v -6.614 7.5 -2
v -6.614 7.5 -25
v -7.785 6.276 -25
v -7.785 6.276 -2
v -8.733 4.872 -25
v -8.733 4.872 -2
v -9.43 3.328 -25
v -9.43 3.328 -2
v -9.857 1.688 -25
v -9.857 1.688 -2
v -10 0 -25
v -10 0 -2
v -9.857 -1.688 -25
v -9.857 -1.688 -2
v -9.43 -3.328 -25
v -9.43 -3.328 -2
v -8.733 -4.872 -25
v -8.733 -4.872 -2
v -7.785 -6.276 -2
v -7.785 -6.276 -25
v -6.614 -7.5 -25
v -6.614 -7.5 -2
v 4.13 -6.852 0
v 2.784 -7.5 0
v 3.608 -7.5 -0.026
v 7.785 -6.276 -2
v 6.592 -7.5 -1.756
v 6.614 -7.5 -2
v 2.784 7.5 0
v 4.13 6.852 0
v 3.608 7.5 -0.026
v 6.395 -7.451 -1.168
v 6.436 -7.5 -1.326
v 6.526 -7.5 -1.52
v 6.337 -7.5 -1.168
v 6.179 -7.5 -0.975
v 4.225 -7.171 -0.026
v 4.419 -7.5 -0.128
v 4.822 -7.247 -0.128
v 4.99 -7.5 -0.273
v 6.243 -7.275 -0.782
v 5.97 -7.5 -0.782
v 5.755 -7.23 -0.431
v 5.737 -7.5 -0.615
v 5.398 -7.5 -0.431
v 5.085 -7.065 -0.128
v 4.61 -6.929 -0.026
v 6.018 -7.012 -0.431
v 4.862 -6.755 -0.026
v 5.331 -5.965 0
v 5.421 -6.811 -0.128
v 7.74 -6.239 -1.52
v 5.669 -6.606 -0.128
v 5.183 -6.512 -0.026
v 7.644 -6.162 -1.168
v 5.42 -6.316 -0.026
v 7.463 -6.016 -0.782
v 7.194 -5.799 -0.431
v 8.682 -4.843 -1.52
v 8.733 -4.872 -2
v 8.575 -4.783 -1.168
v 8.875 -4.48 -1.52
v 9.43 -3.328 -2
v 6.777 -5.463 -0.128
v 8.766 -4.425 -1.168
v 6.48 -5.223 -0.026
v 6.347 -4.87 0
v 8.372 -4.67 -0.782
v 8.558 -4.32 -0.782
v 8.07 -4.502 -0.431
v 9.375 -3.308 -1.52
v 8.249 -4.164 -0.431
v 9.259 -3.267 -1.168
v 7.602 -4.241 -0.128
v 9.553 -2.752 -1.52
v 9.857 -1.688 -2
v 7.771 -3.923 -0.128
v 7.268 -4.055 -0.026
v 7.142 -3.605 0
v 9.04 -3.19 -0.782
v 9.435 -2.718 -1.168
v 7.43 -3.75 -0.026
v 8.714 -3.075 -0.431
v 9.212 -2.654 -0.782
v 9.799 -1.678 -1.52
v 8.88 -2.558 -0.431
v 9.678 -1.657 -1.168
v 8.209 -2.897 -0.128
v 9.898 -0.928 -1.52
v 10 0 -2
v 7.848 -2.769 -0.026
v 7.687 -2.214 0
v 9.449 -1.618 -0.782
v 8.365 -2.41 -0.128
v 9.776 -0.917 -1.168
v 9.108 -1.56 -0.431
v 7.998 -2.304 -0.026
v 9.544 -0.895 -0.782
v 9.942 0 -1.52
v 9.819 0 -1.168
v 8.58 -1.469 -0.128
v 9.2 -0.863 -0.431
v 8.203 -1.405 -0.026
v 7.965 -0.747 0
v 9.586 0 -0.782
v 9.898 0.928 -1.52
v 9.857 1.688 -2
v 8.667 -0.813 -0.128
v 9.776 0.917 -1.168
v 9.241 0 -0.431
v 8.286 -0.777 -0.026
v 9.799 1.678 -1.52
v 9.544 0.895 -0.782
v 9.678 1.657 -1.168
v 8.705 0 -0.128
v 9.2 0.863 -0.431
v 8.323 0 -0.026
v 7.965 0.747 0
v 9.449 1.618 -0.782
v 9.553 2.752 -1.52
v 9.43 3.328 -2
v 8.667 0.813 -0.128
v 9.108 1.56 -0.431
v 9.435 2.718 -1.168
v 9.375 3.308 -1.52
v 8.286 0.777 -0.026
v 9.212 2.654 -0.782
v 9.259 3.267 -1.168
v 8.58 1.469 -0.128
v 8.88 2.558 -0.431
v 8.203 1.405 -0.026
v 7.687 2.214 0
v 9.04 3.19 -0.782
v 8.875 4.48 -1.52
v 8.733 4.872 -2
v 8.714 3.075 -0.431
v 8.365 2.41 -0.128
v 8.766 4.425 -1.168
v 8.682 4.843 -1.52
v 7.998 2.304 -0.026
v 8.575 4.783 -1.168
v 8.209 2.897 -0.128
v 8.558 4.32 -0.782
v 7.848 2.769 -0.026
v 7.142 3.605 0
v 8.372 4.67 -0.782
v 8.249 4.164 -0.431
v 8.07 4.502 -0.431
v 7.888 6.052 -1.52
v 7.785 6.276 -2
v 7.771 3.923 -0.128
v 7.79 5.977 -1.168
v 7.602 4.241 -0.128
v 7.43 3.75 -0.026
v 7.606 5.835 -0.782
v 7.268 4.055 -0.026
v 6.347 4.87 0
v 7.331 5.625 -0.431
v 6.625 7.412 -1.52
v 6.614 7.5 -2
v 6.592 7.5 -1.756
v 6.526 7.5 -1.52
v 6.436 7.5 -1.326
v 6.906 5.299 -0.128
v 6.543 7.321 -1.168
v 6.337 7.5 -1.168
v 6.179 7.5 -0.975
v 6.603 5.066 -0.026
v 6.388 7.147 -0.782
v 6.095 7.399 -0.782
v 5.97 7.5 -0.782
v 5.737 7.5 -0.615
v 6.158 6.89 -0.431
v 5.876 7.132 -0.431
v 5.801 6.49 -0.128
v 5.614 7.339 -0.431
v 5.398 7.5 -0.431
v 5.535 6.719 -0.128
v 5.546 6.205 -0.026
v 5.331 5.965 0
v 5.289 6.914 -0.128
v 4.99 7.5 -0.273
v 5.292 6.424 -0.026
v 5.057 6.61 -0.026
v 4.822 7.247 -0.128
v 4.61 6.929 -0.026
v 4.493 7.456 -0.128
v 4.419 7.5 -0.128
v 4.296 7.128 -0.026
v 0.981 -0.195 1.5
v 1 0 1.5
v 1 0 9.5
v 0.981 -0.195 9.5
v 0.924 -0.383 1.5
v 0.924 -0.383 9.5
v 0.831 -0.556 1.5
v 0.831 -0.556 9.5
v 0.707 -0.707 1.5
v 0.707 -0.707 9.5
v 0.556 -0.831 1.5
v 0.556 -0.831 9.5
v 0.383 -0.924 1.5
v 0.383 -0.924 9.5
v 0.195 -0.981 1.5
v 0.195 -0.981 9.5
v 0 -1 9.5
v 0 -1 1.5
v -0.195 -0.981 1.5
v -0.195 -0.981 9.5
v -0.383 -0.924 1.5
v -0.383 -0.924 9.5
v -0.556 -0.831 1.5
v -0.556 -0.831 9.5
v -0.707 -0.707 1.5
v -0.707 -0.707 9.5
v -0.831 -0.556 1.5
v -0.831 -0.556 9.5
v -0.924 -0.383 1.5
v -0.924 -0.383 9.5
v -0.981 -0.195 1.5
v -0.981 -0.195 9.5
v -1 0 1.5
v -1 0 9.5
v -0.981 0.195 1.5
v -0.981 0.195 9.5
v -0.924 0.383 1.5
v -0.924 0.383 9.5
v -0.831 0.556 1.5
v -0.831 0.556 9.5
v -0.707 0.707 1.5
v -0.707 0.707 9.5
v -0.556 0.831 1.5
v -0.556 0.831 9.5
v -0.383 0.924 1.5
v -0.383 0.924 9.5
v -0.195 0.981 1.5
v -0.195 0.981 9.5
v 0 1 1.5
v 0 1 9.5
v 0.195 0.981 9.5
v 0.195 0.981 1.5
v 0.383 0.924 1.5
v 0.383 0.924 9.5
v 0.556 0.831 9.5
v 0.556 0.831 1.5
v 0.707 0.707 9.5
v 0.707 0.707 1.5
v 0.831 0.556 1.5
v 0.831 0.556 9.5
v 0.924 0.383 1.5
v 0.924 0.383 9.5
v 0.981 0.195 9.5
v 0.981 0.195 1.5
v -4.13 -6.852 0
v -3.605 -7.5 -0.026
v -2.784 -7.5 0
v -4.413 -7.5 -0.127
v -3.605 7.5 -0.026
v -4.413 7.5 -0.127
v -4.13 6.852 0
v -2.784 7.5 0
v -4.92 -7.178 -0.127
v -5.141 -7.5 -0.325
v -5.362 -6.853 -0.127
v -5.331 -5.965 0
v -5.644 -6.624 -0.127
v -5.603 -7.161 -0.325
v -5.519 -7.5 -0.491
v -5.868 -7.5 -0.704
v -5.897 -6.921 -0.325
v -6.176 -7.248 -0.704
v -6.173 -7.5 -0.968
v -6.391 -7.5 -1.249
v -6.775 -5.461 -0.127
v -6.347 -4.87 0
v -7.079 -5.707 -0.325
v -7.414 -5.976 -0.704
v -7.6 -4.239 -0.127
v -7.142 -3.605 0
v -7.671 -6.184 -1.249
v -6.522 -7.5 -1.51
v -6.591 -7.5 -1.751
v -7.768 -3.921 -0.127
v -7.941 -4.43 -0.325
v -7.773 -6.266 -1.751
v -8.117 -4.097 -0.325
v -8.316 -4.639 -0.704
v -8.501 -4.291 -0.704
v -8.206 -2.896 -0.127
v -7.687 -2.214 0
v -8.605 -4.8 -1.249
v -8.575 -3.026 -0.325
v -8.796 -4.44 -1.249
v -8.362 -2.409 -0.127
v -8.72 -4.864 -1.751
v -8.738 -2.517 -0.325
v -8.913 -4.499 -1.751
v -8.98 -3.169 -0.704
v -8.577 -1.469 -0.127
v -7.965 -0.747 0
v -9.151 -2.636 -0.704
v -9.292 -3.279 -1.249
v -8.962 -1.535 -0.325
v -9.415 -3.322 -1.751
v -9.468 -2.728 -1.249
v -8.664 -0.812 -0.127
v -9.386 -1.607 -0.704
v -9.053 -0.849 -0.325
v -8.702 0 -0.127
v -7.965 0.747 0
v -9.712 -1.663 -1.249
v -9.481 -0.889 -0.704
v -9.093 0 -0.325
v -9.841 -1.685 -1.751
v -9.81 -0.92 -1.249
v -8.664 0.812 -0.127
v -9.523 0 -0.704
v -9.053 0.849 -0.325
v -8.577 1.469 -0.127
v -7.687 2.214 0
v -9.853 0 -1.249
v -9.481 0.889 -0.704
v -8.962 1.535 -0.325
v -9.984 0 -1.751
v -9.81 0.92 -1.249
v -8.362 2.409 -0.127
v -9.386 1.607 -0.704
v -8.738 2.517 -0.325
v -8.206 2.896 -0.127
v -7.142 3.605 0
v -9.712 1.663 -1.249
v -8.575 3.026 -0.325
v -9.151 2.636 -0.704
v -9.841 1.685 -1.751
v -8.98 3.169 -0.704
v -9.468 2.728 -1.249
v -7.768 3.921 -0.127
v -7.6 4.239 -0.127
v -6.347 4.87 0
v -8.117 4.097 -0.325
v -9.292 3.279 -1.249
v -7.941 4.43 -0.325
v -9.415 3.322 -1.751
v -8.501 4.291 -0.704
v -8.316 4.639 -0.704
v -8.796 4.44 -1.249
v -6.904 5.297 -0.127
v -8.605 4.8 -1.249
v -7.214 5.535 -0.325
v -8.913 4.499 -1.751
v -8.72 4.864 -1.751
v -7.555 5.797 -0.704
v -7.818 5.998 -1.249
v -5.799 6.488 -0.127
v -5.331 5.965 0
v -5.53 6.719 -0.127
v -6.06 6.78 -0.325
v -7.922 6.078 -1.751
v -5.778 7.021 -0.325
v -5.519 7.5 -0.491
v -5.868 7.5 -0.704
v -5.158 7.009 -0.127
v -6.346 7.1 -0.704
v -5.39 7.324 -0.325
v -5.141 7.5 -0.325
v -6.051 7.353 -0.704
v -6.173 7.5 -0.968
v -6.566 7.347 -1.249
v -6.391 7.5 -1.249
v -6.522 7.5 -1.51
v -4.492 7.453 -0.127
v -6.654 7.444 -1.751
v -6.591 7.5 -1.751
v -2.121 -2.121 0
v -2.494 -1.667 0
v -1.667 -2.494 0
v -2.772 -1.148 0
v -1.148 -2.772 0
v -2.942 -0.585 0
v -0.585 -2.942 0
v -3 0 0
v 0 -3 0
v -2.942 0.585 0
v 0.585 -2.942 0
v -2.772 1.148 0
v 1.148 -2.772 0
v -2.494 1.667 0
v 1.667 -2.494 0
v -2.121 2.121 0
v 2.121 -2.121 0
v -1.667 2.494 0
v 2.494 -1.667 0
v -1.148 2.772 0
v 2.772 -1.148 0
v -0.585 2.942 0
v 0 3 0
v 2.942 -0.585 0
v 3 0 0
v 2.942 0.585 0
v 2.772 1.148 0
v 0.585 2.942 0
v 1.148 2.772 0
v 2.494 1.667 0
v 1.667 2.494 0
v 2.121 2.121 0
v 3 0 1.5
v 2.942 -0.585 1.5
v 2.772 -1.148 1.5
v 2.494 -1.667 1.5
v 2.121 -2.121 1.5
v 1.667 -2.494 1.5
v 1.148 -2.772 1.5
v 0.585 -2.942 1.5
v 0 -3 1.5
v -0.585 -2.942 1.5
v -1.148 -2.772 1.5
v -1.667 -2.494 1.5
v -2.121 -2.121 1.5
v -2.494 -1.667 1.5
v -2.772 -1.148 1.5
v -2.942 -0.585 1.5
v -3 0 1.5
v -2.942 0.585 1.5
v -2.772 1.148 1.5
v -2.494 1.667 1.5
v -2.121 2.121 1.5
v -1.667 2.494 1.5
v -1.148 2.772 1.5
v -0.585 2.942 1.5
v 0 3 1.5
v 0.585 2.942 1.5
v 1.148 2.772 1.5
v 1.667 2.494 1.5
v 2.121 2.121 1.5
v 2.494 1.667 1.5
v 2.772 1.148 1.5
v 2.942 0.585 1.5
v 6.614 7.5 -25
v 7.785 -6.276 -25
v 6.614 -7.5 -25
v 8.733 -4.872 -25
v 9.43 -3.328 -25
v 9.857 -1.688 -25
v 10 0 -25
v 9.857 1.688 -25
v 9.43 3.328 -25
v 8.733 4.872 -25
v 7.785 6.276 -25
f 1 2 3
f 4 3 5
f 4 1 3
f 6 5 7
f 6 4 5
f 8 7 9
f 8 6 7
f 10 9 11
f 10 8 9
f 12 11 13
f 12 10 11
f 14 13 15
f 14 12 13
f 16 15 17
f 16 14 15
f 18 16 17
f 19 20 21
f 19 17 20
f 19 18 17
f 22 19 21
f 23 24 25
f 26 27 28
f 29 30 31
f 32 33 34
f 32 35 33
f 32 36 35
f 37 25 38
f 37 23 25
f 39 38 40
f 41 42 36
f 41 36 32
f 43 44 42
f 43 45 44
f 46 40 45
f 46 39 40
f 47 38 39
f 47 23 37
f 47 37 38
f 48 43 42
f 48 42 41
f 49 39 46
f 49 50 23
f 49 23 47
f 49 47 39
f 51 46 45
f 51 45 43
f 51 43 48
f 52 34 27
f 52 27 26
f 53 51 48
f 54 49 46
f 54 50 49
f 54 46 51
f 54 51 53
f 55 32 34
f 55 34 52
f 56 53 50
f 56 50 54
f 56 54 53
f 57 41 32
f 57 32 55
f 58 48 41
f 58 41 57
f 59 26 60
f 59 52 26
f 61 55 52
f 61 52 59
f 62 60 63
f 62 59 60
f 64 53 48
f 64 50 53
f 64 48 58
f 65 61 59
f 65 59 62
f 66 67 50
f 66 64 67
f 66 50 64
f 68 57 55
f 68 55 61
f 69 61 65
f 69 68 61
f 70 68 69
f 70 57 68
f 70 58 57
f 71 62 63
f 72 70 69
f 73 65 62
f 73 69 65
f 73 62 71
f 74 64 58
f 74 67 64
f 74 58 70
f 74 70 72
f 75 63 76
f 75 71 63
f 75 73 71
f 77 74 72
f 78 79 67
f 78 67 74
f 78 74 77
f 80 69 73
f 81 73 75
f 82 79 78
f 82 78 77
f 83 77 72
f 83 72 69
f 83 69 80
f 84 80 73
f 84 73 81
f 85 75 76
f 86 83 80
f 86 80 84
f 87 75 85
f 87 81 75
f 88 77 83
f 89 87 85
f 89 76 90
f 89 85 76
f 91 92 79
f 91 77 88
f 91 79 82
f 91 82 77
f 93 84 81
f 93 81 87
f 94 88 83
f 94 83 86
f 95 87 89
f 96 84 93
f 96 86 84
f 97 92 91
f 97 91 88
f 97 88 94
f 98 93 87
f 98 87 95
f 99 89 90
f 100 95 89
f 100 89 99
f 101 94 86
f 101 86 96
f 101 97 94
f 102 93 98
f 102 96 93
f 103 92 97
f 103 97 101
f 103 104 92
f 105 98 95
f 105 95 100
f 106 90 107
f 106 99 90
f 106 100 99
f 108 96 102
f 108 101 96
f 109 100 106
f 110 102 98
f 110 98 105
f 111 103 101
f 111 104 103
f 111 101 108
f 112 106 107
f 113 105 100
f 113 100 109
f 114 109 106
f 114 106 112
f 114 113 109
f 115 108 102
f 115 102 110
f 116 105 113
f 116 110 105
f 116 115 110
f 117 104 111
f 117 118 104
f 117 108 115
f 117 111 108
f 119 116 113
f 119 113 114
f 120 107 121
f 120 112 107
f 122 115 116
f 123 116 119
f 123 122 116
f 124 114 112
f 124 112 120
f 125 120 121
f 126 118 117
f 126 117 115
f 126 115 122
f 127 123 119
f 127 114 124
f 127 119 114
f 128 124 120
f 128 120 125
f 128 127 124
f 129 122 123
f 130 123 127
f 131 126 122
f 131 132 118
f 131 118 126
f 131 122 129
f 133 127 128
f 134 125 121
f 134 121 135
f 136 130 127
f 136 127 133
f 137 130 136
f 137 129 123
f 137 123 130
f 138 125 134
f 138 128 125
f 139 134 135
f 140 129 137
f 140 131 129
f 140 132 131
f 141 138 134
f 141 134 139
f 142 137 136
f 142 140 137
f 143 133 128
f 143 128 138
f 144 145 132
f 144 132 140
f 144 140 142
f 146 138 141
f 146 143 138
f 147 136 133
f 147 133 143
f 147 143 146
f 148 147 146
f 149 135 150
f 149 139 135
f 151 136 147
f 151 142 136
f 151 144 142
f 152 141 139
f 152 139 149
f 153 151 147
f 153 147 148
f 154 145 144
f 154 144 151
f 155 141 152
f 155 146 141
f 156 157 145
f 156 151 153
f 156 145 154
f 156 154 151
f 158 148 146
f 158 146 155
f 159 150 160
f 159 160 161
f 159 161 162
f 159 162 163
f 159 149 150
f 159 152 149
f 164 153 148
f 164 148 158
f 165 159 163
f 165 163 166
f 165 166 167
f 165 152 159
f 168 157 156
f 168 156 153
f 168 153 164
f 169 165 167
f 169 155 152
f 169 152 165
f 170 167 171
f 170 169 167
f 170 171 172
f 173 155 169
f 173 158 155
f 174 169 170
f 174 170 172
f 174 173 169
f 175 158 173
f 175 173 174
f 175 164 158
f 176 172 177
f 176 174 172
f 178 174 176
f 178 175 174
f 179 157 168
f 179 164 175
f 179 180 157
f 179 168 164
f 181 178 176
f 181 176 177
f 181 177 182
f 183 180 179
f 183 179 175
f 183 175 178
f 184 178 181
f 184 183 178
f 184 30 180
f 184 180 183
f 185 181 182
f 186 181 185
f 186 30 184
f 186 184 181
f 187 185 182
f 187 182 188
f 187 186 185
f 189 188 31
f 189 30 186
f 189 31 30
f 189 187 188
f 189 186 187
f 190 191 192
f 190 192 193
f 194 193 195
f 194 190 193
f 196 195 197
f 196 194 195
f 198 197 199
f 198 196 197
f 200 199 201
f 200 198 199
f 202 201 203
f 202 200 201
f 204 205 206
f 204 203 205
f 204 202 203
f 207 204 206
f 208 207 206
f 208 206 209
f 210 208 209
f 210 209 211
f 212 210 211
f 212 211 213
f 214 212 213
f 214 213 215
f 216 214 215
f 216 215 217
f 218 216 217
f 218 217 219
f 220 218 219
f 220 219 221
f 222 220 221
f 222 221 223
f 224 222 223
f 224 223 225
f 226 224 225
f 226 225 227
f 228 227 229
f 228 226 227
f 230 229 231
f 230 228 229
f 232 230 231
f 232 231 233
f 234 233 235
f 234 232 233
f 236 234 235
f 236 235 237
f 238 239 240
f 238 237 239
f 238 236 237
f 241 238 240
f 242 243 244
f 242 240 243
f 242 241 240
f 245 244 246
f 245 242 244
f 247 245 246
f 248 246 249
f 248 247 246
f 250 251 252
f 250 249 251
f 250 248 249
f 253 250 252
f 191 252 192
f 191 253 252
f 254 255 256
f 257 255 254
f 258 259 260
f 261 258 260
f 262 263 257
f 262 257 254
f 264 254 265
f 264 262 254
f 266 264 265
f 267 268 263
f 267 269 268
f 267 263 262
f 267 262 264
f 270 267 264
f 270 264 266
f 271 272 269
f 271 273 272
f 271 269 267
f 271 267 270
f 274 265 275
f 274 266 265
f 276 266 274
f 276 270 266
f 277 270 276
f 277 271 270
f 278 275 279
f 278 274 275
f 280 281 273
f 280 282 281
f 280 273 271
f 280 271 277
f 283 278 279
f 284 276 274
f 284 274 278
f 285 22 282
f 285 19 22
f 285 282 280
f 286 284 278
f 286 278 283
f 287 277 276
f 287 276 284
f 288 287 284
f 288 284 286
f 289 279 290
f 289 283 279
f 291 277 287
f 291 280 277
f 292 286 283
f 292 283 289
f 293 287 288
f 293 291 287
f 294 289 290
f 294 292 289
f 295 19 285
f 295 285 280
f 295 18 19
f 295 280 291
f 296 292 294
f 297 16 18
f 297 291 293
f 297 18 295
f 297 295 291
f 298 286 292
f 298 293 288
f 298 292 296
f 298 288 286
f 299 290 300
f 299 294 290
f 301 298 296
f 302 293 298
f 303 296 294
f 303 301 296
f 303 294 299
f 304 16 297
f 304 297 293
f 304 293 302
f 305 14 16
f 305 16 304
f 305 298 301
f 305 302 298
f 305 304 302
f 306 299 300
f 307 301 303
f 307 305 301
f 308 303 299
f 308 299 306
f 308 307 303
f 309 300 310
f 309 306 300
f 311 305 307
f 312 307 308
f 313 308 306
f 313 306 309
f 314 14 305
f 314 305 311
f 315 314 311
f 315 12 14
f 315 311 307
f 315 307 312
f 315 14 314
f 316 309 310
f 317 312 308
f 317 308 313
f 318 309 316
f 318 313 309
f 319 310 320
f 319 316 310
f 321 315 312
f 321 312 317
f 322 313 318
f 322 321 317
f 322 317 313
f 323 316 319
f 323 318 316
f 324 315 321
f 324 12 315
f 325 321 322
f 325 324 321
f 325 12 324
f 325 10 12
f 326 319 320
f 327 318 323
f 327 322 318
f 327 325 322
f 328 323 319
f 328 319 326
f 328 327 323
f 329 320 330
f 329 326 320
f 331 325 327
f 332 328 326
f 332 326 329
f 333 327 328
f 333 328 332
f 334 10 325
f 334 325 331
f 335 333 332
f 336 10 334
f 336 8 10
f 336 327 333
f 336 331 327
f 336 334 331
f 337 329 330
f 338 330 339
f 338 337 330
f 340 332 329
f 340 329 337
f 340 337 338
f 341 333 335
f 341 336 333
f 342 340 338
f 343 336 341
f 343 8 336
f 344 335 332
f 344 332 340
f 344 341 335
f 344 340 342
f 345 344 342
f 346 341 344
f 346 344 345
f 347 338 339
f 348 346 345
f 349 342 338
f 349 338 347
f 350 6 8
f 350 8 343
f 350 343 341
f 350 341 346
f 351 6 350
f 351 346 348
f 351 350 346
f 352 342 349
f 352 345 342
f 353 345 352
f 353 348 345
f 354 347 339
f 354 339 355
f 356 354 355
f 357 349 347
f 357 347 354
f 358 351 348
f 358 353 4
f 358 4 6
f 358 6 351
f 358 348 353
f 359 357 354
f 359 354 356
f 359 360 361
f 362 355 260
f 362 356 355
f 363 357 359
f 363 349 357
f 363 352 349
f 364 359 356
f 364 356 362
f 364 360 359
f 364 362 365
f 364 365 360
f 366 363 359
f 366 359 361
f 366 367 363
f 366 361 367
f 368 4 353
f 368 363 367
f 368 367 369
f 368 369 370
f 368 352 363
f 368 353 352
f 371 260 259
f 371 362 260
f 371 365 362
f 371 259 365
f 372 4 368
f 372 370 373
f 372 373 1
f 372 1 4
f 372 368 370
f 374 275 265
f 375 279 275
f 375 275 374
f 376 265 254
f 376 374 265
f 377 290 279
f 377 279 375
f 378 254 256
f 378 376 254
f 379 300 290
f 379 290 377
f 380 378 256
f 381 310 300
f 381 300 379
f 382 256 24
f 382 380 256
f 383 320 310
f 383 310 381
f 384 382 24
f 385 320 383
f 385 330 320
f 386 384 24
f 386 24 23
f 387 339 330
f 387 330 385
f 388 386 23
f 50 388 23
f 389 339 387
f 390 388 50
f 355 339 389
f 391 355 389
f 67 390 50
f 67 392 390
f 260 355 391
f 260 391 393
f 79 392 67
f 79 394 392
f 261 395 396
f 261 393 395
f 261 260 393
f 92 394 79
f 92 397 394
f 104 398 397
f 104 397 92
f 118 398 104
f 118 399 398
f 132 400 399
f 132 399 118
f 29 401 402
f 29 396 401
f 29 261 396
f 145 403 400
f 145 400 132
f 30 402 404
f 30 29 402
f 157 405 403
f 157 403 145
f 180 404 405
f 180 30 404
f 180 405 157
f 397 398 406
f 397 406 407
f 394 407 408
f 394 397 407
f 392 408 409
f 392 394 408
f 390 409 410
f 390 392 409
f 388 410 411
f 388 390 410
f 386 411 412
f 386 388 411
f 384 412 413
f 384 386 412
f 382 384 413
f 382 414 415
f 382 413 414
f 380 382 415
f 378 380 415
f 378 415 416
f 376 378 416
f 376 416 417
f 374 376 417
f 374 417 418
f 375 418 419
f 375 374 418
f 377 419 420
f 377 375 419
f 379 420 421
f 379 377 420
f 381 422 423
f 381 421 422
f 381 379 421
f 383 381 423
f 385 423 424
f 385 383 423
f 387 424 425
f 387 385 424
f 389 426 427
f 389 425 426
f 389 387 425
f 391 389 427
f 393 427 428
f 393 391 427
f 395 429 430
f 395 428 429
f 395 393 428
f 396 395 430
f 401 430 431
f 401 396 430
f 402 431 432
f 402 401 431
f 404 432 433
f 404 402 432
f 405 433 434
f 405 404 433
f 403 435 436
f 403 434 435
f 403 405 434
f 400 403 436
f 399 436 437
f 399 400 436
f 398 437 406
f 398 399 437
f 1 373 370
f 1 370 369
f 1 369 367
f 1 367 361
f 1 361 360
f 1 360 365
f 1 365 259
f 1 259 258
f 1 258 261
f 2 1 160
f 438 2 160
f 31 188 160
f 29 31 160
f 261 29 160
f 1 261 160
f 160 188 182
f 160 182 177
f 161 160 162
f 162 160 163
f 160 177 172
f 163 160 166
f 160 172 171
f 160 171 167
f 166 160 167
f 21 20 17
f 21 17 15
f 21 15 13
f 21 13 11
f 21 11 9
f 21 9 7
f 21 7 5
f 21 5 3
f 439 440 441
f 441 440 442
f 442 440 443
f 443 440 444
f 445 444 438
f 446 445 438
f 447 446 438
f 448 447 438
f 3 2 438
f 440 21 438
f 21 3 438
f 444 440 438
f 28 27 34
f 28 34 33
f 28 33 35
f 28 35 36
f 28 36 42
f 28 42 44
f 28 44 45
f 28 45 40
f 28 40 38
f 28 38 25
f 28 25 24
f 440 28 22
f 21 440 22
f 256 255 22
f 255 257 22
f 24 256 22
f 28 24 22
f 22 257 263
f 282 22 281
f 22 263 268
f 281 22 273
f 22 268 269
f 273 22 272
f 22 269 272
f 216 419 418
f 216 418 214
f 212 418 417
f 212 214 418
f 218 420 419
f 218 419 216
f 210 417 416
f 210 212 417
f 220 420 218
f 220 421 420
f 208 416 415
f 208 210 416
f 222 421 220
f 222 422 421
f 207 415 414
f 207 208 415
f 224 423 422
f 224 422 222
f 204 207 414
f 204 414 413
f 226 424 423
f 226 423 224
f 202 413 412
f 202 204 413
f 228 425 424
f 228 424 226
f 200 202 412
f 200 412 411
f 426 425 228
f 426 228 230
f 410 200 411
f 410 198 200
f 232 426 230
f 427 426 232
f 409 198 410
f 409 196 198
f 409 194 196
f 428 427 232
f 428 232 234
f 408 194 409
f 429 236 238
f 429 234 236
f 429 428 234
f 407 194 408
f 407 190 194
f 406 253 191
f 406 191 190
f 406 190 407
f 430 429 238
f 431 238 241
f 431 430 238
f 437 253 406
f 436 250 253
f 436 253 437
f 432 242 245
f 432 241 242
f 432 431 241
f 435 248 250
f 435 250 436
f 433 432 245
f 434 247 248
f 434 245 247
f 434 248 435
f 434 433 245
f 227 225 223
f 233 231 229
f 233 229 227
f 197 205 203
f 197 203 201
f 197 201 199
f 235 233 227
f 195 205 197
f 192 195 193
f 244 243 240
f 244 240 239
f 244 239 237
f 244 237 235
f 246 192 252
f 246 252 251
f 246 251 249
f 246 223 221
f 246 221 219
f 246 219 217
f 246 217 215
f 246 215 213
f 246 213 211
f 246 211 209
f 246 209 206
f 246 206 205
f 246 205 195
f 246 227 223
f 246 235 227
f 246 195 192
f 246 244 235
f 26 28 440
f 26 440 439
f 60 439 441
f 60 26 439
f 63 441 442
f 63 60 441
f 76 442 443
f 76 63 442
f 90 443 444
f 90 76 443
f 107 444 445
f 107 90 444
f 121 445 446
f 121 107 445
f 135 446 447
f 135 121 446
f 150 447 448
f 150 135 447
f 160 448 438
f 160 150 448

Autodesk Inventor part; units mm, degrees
ref_plane "YZ Plane" through (0, 0, 0) normal (1, 0, 0) x (0, 1, 0)
ref_plane "XZ Plane" through (0, 0, 0) normal (0, 1, 0) x (-1, 0, 0)
ref_plane "XY Plane" through (0, 0, 0) normal (0, 0, 1) x (1, 0, 0)
sketch "Sketch1" plane through (0, 0, 0) normal (0, 0, 1) x (1, 0, 0)
  circle A0 centre (0, 0) radius 10
  line L0 (-10, -7.5) -> (-10, 7.5)
  line L1 (-10, 7.5) -> (10, 7.5)
  line L2 (10, 7.5) -> (10, -7.5)
  line L3 (10, -7.5) -> (-10, -7.5)
  line L4 (-10, -7.5) -> (10, 7.5) construction
  line L5 (-10, 7.5) -> (10, -7.5) construction
  circle A1 centre (0, 0) radius 3
  circle A2 centre (0, 0) radius 1
  point P0 (-6.6144, -7.5)
  point P1 (6.6144, -7.5)
  point P2 (6.6144, 7.5)
  point P3 (-6.6144, 7.5)
  dimension "d0" = 20
  dimension "d1" = 15
  dimension "d2" = 6
  dimension "d3" = 2
extrude "Extrusion1" add sketch "Sketch1" along normal blind 1.5 contours A1
extrude "Extrusion2" add sketch "Sketch1" along normal blind 9.5 contours A2
extrude "Extrusion3" add sketch "Sketch1" against normal blind 25 contours A0 L3 L1 | A1 | A2
fillet "Fillet1" radius 2 2 edges at (-10, 0, 0) (10, 0, 0)
properties part number "Pumpe"
